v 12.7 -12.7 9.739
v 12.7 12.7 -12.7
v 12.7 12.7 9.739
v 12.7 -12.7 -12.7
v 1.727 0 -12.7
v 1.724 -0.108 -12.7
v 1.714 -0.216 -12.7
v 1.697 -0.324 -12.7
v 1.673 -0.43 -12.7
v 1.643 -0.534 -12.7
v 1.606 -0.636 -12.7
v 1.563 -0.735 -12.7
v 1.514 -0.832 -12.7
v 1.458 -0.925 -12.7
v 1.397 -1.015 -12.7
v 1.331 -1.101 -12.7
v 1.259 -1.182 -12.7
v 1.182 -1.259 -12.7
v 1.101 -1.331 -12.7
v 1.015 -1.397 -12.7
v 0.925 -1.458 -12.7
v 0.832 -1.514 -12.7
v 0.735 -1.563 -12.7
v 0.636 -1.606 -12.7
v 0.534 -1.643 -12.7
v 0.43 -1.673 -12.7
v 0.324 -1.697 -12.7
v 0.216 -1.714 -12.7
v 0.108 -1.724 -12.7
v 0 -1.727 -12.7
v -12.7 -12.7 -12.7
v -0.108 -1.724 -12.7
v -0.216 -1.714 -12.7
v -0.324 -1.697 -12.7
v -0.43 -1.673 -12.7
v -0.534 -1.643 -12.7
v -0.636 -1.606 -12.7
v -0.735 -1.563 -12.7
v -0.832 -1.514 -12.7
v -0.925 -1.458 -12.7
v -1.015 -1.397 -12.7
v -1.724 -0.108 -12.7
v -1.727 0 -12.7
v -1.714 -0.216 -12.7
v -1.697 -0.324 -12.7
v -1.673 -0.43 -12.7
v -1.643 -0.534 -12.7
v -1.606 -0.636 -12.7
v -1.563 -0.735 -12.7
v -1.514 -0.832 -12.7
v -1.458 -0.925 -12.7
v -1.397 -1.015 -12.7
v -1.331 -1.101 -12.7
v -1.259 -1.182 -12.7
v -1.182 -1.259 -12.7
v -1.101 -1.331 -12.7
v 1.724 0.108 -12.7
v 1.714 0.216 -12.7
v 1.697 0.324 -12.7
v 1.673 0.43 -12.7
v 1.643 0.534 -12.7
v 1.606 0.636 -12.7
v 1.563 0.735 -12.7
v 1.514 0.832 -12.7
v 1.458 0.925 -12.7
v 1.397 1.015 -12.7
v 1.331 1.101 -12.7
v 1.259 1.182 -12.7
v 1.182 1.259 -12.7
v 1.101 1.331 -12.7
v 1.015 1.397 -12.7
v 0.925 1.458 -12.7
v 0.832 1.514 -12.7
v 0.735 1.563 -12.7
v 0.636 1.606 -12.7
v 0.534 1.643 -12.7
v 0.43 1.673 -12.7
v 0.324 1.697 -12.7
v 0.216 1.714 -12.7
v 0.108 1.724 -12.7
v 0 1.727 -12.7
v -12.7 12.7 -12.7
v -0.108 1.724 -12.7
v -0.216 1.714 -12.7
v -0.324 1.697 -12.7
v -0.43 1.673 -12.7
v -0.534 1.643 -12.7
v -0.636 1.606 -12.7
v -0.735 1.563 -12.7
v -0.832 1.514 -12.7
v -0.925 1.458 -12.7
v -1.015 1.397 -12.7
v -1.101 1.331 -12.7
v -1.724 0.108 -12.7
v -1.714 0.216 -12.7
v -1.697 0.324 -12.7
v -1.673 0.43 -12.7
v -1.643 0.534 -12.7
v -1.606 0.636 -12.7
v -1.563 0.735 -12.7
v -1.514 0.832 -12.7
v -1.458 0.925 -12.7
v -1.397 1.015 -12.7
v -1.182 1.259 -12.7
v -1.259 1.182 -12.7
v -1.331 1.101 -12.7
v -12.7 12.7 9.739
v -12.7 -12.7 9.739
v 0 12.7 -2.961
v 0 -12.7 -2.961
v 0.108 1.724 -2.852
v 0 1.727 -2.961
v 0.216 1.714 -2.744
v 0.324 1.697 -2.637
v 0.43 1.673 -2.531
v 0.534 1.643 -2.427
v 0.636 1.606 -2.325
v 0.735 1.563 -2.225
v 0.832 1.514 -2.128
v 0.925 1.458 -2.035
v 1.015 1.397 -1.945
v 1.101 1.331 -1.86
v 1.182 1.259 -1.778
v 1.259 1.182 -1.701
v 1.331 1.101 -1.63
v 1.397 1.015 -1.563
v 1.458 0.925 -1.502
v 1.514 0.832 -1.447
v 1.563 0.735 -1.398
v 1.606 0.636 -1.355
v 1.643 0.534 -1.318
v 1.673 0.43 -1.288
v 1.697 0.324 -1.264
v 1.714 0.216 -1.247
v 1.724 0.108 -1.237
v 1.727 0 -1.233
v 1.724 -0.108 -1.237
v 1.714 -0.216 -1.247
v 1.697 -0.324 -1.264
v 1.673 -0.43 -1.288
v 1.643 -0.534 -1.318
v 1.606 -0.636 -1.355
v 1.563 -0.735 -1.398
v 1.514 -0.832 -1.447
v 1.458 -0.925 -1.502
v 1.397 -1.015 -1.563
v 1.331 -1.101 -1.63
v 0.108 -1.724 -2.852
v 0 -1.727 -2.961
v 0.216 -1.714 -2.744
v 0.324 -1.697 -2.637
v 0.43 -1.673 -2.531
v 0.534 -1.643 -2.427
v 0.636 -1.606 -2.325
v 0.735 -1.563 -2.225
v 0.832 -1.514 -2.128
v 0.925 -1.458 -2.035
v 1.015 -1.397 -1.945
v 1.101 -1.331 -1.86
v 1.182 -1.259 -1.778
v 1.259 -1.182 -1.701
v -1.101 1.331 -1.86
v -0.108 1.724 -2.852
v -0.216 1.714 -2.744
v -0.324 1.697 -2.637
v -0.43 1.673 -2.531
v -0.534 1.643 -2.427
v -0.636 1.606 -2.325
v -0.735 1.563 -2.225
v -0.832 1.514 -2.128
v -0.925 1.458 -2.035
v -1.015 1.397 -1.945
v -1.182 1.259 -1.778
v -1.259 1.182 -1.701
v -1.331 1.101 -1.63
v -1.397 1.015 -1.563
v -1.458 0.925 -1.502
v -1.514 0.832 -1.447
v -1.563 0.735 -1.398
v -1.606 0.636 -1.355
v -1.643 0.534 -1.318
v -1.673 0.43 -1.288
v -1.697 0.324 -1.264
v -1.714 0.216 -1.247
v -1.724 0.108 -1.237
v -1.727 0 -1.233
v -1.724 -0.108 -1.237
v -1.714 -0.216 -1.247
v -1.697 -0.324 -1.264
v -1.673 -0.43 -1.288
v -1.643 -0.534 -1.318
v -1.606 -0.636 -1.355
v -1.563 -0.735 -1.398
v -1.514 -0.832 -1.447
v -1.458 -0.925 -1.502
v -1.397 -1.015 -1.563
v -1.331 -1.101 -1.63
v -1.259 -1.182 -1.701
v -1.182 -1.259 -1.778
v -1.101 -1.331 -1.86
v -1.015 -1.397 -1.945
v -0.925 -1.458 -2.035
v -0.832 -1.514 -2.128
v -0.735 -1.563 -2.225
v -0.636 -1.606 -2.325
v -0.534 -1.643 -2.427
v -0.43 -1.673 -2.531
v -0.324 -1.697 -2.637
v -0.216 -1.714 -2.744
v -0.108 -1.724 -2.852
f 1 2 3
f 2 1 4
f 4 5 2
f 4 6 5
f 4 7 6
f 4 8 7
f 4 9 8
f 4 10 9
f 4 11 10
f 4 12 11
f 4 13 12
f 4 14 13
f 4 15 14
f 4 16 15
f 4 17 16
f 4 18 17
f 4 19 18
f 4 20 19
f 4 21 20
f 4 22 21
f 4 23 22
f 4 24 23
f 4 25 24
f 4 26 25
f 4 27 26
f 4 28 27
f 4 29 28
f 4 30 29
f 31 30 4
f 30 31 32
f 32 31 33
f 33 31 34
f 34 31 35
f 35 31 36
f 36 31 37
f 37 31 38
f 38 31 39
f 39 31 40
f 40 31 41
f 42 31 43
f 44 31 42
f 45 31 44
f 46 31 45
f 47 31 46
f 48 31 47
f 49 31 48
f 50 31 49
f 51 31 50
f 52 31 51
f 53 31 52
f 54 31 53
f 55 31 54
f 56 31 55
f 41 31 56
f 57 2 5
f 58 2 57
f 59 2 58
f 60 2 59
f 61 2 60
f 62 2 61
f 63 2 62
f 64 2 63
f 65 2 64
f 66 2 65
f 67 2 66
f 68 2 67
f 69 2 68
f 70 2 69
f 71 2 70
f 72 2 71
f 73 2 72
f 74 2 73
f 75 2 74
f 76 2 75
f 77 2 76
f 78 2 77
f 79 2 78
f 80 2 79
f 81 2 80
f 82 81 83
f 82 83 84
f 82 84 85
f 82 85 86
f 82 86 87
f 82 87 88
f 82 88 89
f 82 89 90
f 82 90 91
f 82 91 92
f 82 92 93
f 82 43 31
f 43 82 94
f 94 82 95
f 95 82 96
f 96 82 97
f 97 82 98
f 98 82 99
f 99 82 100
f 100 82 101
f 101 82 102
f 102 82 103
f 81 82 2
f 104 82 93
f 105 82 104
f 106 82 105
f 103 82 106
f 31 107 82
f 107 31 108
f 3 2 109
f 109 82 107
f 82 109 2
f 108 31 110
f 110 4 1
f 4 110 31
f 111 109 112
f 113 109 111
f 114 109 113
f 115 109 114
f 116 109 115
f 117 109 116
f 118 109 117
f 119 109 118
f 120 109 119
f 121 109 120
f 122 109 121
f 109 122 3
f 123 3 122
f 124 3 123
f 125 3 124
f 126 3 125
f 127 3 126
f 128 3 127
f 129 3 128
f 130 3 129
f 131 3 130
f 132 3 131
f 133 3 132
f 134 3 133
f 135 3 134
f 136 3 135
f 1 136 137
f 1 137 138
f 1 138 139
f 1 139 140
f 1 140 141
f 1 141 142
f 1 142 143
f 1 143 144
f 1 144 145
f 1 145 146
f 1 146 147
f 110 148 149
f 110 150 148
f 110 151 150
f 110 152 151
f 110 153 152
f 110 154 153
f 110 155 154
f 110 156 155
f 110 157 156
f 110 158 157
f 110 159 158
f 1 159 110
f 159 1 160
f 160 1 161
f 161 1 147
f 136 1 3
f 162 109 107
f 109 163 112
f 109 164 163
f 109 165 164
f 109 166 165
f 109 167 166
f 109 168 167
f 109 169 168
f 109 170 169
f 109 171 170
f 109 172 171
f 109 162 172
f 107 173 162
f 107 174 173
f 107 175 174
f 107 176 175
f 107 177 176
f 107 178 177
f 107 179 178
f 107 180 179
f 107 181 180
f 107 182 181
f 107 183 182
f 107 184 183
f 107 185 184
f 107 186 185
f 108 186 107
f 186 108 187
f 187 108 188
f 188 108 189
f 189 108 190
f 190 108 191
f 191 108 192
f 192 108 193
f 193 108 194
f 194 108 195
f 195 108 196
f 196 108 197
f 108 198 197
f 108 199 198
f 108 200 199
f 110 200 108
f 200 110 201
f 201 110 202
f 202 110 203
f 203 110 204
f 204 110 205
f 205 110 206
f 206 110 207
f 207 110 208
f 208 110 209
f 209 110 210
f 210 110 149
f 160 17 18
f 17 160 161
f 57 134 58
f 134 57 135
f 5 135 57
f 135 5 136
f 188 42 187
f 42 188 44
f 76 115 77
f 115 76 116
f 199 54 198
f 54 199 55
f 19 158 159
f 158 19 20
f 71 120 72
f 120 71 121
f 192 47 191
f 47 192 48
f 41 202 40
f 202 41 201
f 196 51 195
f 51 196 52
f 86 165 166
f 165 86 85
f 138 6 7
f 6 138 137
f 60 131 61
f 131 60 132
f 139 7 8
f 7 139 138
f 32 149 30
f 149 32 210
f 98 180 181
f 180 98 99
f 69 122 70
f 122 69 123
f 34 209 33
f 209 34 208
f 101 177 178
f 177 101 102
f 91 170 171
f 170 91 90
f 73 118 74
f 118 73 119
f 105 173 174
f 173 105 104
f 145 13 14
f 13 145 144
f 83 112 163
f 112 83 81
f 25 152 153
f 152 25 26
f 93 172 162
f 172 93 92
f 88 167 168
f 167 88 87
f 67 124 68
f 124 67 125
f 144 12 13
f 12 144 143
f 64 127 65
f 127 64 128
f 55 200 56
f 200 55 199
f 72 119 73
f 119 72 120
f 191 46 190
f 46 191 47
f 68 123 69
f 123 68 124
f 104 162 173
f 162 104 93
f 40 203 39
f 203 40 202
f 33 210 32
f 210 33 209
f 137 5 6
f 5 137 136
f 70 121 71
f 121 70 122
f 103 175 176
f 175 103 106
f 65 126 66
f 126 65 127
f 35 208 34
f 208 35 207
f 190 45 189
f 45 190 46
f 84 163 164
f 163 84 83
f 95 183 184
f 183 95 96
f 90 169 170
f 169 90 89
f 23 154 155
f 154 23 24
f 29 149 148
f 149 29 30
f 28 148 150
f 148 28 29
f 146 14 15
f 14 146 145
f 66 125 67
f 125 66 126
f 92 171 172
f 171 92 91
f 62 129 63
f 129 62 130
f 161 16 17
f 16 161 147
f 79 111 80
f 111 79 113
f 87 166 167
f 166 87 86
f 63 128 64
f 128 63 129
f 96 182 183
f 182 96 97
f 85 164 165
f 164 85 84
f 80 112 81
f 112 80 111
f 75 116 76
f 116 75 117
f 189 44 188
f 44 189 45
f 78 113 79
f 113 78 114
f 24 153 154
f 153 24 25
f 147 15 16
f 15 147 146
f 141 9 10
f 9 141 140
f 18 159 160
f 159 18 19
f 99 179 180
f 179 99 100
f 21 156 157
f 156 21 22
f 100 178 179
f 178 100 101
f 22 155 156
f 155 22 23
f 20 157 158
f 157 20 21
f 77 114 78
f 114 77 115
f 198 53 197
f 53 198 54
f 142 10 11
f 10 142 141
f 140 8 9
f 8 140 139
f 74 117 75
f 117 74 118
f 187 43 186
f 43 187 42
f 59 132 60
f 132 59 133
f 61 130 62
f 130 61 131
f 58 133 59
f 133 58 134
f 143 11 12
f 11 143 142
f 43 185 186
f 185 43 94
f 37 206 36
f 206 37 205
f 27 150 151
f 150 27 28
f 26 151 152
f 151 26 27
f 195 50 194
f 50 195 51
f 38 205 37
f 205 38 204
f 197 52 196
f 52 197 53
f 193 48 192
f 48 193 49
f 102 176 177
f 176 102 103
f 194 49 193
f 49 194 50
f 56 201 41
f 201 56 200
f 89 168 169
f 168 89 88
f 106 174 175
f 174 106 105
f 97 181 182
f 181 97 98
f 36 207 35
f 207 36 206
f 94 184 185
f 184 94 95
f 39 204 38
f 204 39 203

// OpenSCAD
$fn=100;

in=25.4;

l=1*in;
w=l;
h=l;

d8=0.136*in;

difference()
{
cube([l,w,h], center=true);

translate([0,0,15]) rotate([0,45,0]) cube([l,w,h], center=true);
cylinder(h=1*in, r=d8/2, center=true);
}
